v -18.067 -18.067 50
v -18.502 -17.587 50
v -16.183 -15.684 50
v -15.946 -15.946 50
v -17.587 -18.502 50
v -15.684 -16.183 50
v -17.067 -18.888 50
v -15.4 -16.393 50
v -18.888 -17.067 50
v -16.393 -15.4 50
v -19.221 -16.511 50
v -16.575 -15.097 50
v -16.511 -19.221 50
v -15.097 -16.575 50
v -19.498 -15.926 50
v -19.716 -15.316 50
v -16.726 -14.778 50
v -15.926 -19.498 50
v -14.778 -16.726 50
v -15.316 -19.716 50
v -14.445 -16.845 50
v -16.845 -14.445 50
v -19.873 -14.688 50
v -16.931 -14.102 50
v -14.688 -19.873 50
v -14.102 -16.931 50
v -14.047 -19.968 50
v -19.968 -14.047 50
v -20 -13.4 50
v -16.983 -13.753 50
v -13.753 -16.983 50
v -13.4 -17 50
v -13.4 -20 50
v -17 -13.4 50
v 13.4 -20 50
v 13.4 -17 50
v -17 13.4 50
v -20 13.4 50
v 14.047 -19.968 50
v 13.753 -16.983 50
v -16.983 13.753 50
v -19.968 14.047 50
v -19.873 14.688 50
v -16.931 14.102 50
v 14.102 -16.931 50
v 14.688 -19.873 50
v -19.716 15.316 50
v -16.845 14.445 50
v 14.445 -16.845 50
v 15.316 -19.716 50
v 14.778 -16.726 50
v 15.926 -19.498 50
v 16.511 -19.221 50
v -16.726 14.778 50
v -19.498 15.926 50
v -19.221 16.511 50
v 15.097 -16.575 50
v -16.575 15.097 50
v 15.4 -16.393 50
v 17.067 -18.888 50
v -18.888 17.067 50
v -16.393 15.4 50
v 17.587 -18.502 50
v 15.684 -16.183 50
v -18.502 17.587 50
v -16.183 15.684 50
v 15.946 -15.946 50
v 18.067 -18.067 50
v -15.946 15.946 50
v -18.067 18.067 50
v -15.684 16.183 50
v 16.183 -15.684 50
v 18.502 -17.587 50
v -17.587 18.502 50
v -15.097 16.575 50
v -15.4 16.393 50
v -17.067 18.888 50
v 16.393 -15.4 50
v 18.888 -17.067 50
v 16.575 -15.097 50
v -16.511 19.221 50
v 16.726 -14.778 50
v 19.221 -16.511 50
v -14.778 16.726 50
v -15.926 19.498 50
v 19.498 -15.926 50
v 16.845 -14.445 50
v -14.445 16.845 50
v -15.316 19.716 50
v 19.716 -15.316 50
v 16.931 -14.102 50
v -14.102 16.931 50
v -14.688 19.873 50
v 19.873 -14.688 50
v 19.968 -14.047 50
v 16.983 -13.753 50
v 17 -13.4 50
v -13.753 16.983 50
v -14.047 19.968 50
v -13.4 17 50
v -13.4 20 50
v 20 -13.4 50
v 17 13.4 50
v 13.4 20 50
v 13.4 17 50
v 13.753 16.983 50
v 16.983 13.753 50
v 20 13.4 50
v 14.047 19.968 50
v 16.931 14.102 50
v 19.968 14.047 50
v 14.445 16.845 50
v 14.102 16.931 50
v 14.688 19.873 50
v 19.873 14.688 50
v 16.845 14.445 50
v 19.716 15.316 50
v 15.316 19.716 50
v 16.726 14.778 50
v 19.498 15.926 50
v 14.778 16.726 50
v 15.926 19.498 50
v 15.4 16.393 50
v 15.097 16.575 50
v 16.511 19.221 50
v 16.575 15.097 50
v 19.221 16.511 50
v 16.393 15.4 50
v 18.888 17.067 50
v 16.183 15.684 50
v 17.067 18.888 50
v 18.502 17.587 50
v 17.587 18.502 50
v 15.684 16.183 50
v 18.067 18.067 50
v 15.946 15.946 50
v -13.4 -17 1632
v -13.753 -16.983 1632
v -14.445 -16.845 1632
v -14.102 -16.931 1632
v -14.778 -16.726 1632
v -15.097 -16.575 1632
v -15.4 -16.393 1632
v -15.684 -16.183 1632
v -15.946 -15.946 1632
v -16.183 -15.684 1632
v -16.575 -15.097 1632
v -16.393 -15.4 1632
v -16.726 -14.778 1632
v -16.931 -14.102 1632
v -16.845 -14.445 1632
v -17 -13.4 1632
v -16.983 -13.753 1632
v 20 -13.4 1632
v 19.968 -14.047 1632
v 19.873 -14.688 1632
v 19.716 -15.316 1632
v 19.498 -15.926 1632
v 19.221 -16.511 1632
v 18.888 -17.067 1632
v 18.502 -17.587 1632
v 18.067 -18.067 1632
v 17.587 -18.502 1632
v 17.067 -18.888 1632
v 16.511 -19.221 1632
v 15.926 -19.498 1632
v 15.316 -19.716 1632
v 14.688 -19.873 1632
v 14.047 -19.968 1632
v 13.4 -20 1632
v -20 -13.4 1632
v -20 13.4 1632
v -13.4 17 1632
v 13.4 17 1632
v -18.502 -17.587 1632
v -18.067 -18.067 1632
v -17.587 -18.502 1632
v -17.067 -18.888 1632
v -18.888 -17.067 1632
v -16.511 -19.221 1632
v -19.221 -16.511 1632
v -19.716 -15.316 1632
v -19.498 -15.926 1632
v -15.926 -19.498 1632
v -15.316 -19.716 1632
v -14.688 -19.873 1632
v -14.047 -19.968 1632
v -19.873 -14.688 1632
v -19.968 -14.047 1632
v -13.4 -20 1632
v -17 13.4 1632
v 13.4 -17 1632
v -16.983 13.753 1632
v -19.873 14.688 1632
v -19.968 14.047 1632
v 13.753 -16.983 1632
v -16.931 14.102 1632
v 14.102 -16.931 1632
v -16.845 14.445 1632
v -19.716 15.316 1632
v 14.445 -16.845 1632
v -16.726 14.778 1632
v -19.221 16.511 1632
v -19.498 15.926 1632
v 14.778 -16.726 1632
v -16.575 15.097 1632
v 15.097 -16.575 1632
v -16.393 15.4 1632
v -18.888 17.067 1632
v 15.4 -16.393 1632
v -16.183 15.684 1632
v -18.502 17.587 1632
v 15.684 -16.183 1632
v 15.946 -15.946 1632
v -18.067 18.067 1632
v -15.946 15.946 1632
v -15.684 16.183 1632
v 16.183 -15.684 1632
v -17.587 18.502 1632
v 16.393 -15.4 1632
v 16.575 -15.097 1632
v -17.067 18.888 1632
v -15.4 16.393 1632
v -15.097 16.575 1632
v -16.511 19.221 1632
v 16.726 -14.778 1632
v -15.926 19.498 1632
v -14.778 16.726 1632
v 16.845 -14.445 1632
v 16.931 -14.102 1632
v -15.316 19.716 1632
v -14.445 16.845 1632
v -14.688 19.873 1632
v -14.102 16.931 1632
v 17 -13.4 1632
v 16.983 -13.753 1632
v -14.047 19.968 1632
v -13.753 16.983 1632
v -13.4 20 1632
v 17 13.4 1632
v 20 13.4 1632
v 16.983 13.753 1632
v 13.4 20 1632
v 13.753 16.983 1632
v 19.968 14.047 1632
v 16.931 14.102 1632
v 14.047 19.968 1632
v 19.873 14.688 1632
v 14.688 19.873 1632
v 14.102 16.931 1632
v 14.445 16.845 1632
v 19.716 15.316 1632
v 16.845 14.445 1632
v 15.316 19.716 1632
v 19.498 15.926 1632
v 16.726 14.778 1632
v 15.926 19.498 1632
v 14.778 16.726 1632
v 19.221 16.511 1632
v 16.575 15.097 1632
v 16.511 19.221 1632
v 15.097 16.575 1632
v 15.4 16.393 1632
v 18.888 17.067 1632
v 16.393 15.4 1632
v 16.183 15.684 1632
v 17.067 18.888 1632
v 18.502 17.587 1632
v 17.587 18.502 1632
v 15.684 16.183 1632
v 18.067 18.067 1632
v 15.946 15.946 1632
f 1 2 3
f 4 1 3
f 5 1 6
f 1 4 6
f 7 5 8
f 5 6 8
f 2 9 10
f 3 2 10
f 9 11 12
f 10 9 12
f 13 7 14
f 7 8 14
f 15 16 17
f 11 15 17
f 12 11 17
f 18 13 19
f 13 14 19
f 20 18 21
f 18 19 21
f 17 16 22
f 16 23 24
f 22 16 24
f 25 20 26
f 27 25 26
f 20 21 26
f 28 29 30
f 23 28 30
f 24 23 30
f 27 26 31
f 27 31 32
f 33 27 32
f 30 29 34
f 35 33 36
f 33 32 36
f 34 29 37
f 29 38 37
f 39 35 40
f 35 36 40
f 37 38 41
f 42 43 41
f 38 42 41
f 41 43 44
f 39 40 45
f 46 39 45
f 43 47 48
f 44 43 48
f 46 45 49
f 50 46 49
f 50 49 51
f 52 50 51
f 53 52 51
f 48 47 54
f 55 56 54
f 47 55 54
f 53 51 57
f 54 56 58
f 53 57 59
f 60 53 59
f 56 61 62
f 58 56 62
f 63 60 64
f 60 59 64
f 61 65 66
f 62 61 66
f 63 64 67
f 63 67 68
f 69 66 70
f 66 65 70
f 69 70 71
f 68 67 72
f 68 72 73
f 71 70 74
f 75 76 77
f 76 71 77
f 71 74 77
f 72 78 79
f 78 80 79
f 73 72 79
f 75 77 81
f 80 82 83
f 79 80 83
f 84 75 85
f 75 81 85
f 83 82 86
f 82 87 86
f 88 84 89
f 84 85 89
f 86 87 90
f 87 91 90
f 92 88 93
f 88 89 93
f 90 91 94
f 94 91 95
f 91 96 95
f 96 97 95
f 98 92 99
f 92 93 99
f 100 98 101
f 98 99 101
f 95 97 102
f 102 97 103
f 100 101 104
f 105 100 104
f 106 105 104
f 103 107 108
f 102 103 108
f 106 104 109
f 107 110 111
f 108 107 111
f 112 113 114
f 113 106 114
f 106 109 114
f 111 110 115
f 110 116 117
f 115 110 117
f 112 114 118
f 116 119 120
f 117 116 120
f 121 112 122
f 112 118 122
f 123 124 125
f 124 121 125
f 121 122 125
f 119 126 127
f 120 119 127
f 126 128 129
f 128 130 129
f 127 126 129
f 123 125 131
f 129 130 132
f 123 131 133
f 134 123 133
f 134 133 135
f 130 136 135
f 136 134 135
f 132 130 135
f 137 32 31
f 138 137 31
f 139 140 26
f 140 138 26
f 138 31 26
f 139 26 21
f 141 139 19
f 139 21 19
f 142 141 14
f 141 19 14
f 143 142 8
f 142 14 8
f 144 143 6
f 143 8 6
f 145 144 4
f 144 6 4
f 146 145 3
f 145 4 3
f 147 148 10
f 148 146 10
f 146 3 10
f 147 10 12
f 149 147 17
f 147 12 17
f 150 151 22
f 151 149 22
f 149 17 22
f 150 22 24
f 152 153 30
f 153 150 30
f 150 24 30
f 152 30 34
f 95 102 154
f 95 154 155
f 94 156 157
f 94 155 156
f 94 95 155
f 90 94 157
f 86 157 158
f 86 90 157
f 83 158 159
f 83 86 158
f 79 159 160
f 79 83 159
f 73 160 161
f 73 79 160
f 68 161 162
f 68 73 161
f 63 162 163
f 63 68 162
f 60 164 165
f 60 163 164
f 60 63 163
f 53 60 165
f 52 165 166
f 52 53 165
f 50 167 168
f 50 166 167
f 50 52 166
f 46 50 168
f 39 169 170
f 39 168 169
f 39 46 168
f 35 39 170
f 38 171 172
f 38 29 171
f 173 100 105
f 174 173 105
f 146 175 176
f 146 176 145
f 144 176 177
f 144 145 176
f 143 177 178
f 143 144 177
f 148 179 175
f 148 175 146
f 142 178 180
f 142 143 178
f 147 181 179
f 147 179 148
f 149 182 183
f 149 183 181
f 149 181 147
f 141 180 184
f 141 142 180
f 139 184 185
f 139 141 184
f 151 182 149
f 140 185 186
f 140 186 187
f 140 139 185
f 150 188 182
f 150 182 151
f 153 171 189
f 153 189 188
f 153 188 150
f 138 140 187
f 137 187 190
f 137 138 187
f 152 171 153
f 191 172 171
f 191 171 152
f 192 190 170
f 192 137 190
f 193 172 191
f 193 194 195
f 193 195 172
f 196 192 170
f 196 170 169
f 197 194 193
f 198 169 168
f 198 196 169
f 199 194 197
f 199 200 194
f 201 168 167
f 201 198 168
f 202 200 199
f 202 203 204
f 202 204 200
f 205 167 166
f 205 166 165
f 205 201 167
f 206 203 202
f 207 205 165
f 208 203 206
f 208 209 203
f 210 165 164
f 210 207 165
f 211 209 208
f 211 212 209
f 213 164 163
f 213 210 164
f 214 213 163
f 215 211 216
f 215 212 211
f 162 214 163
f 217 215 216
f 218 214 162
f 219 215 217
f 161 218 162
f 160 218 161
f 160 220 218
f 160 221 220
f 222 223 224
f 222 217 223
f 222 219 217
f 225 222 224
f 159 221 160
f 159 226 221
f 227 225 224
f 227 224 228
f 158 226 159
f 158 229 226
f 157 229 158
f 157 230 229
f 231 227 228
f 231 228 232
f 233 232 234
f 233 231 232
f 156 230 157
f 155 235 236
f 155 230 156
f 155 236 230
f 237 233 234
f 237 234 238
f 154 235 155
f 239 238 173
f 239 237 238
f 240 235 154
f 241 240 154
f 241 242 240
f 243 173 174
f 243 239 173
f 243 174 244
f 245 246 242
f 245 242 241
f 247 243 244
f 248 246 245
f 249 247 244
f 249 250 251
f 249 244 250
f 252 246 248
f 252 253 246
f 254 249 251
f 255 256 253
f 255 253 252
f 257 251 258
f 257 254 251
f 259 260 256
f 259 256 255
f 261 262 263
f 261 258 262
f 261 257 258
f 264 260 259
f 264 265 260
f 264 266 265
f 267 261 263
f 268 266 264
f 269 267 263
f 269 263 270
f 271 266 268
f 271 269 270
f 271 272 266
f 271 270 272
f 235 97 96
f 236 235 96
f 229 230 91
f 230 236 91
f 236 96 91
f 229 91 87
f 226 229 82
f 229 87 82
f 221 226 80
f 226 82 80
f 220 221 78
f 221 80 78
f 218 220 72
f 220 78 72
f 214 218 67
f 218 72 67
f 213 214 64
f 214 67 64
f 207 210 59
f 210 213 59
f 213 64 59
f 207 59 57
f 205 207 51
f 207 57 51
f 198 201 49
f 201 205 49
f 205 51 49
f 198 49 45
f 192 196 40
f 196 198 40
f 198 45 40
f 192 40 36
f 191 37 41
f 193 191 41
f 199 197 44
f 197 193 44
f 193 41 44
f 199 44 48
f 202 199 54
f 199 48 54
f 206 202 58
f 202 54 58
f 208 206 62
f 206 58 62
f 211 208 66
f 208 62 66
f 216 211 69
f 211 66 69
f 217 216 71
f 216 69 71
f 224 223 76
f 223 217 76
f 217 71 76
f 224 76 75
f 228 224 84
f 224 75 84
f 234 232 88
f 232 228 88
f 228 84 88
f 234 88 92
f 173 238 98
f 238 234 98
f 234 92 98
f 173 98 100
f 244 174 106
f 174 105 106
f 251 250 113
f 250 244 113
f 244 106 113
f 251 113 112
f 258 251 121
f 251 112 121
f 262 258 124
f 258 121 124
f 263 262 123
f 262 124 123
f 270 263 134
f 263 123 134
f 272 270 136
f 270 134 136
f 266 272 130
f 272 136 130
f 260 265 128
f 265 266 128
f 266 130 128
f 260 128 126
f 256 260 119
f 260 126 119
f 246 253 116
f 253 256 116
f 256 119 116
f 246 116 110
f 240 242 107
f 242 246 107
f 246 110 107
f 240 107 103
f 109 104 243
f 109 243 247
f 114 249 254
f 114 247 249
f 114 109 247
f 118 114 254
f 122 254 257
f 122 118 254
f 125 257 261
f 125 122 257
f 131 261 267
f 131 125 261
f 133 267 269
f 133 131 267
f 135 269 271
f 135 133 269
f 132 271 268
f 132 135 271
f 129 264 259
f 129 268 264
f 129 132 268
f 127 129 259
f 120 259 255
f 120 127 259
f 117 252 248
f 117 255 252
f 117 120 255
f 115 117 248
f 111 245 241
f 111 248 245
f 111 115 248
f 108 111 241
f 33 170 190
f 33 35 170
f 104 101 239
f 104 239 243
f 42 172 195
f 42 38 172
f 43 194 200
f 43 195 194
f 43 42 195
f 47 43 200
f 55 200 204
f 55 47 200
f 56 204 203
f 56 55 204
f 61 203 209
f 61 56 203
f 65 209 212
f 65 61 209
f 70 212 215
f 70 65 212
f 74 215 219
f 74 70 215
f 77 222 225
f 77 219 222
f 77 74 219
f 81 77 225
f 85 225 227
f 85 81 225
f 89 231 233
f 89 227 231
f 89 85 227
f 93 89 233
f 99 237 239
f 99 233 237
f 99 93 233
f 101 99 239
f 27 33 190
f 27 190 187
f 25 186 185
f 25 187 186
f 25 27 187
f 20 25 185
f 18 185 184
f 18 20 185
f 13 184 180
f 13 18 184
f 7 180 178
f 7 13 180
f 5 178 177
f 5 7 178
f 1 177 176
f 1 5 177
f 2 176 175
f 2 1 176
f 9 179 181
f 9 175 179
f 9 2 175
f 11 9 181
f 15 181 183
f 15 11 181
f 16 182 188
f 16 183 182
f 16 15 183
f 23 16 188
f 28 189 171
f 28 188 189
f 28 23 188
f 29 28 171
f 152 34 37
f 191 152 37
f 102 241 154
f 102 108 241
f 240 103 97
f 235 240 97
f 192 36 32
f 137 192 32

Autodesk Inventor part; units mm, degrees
ref_plane "Start plane" through (0, 0, 50) normal (0, 0, 1) x (1, 0, 0)
ref_plane "End plane" through (0, 0, 1632) normal (0, 0, 1) x (1, 0, 0)
sketch "Sketch" plane through (0, 0, 0) normal (0, 0, 1) x (1, 0, 0)
  line L0 (-20, -13.4) -> (-20, 13.4)
  line L1 (-13.4, 20) -> (13.4, 20)
  line L2 (20, 13.4) -> (20, -13.4)
  line L3 (13.4, -20) -> (-13.4, -20)
  arc A0 (-20, -13.4) -> (-13.4, -20) centre (-13.4, -13.4) ccw
  arc A1 (-13.4, 20) -> (-20, 13.4) centre (-13.4, 13.4) ccw
  arc A2 (20, 13.4) -> (13.4, 20) centre (13.4, 13.4) ccw
  arc A3 (13.4, -20) -> (20, -13.4) centre (13.4, -13.4) ccw
  arc A4 (-13.4, 17) -> (-17, 13.4) centre (-13.4, 13.4) ccw
  line L4 (-13.4, 17) -> (13.4, 17)
  arc A5 (17, 13.4) -> (13.4, 17) centre (13.4, 13.4) ccw
  line L5 (17, 13.4) -> (17, -13.4)
  arc A6 (13.4, -17) -> (17, -13.4) centre (13.4, -13.4) ccw
  line L6 (13.4, -17) -> (-13.4, -17)
  arc A7 (-17, -13.4) -> (-13.4, -17) centre (-13.4, -13.4) ccw
  line L7 (-17, -13.4) -> (-17, 13.4)
  line L8 (0, 22.0873) -> (0, -22.0873) construction
  line L9 (-22.0873, 0) -> (22.0873, 0) construction
  dimension "d7" = 6.6
  dimension "d10" = 40
  dimension "d11" = 40
  dimension "d12" = 3
  dimension "d15" = 20
  dimension "d16" = 20
extrude "Body" add sketch "Sketch" along normal up to surface (1582 mm away) from surface at 50
sketch "Sketch3" plane through (0, 0, 0) normal (0, 0, 1) x (1, 0, 0)
  line L0 (0, 0) -> (10, 0)
ref_plane "Work Plane3" through (0, 0, 0) normal (0, -1, 0) x (1, 0, 0)
sketch "Sketch4" plane through (0, 0, 0) normal (0, -1, 0) x (1, 0, 0)
  line L0 (-2, 50) -> (12, 50)
  line L1 (-2, 1632) -> (12, 1632)
  dimension "d18" = 1582
ref_plane "Work Plane4" through (9.2, 45, 1632) normal (0, 0, 1) x (1, 0, 0)
split "Split1" plane through (9.2, 45, 1632) removes the side toward (0, 0, 1)
ref_plane "Work Plane5" through (-629.2, 45, 50) normal (0, 0, -1) x (-1, 0, 0)
split "Split2" plane through (-629.2, 45, 50) removes the side toward (0, 0, -1)
ref_plane "Work Plane6" through (-630.2, -705, 1632) normal (0, 0, 1) x (1, 0, 0)
split "Split3" plane through (-630.2, -705, 1632) removes the side toward (0, 0, 1)
equation "\"d7\" = G_IR"
equation "\"d10\" = G_H"
equation "\"d11\" = G_W"
equation "\"d12\" = G_T"
equation "\"d15\" = 0.5 * d10"
equation "\"d16\" = 0.5 * d11"
equation "\"d3\" = G_L"
equation "\"G_W\" = 40"
equation "\"G_H\" = 40"
equation "\"G_T\" = 3"
equation "\"G_IR\" = 6.6"
equation "\"G_L\" = d18"
equation "\"d14\" = G_OFFSET_END + B_L"
equation "\"B_L\" = 1682"
equation "\"G_OFFSET_END\" = -50"
properties part number "DIN EN 10305-5 - 40 x 40 x 3  - 1582" material "Steel, Mild"
